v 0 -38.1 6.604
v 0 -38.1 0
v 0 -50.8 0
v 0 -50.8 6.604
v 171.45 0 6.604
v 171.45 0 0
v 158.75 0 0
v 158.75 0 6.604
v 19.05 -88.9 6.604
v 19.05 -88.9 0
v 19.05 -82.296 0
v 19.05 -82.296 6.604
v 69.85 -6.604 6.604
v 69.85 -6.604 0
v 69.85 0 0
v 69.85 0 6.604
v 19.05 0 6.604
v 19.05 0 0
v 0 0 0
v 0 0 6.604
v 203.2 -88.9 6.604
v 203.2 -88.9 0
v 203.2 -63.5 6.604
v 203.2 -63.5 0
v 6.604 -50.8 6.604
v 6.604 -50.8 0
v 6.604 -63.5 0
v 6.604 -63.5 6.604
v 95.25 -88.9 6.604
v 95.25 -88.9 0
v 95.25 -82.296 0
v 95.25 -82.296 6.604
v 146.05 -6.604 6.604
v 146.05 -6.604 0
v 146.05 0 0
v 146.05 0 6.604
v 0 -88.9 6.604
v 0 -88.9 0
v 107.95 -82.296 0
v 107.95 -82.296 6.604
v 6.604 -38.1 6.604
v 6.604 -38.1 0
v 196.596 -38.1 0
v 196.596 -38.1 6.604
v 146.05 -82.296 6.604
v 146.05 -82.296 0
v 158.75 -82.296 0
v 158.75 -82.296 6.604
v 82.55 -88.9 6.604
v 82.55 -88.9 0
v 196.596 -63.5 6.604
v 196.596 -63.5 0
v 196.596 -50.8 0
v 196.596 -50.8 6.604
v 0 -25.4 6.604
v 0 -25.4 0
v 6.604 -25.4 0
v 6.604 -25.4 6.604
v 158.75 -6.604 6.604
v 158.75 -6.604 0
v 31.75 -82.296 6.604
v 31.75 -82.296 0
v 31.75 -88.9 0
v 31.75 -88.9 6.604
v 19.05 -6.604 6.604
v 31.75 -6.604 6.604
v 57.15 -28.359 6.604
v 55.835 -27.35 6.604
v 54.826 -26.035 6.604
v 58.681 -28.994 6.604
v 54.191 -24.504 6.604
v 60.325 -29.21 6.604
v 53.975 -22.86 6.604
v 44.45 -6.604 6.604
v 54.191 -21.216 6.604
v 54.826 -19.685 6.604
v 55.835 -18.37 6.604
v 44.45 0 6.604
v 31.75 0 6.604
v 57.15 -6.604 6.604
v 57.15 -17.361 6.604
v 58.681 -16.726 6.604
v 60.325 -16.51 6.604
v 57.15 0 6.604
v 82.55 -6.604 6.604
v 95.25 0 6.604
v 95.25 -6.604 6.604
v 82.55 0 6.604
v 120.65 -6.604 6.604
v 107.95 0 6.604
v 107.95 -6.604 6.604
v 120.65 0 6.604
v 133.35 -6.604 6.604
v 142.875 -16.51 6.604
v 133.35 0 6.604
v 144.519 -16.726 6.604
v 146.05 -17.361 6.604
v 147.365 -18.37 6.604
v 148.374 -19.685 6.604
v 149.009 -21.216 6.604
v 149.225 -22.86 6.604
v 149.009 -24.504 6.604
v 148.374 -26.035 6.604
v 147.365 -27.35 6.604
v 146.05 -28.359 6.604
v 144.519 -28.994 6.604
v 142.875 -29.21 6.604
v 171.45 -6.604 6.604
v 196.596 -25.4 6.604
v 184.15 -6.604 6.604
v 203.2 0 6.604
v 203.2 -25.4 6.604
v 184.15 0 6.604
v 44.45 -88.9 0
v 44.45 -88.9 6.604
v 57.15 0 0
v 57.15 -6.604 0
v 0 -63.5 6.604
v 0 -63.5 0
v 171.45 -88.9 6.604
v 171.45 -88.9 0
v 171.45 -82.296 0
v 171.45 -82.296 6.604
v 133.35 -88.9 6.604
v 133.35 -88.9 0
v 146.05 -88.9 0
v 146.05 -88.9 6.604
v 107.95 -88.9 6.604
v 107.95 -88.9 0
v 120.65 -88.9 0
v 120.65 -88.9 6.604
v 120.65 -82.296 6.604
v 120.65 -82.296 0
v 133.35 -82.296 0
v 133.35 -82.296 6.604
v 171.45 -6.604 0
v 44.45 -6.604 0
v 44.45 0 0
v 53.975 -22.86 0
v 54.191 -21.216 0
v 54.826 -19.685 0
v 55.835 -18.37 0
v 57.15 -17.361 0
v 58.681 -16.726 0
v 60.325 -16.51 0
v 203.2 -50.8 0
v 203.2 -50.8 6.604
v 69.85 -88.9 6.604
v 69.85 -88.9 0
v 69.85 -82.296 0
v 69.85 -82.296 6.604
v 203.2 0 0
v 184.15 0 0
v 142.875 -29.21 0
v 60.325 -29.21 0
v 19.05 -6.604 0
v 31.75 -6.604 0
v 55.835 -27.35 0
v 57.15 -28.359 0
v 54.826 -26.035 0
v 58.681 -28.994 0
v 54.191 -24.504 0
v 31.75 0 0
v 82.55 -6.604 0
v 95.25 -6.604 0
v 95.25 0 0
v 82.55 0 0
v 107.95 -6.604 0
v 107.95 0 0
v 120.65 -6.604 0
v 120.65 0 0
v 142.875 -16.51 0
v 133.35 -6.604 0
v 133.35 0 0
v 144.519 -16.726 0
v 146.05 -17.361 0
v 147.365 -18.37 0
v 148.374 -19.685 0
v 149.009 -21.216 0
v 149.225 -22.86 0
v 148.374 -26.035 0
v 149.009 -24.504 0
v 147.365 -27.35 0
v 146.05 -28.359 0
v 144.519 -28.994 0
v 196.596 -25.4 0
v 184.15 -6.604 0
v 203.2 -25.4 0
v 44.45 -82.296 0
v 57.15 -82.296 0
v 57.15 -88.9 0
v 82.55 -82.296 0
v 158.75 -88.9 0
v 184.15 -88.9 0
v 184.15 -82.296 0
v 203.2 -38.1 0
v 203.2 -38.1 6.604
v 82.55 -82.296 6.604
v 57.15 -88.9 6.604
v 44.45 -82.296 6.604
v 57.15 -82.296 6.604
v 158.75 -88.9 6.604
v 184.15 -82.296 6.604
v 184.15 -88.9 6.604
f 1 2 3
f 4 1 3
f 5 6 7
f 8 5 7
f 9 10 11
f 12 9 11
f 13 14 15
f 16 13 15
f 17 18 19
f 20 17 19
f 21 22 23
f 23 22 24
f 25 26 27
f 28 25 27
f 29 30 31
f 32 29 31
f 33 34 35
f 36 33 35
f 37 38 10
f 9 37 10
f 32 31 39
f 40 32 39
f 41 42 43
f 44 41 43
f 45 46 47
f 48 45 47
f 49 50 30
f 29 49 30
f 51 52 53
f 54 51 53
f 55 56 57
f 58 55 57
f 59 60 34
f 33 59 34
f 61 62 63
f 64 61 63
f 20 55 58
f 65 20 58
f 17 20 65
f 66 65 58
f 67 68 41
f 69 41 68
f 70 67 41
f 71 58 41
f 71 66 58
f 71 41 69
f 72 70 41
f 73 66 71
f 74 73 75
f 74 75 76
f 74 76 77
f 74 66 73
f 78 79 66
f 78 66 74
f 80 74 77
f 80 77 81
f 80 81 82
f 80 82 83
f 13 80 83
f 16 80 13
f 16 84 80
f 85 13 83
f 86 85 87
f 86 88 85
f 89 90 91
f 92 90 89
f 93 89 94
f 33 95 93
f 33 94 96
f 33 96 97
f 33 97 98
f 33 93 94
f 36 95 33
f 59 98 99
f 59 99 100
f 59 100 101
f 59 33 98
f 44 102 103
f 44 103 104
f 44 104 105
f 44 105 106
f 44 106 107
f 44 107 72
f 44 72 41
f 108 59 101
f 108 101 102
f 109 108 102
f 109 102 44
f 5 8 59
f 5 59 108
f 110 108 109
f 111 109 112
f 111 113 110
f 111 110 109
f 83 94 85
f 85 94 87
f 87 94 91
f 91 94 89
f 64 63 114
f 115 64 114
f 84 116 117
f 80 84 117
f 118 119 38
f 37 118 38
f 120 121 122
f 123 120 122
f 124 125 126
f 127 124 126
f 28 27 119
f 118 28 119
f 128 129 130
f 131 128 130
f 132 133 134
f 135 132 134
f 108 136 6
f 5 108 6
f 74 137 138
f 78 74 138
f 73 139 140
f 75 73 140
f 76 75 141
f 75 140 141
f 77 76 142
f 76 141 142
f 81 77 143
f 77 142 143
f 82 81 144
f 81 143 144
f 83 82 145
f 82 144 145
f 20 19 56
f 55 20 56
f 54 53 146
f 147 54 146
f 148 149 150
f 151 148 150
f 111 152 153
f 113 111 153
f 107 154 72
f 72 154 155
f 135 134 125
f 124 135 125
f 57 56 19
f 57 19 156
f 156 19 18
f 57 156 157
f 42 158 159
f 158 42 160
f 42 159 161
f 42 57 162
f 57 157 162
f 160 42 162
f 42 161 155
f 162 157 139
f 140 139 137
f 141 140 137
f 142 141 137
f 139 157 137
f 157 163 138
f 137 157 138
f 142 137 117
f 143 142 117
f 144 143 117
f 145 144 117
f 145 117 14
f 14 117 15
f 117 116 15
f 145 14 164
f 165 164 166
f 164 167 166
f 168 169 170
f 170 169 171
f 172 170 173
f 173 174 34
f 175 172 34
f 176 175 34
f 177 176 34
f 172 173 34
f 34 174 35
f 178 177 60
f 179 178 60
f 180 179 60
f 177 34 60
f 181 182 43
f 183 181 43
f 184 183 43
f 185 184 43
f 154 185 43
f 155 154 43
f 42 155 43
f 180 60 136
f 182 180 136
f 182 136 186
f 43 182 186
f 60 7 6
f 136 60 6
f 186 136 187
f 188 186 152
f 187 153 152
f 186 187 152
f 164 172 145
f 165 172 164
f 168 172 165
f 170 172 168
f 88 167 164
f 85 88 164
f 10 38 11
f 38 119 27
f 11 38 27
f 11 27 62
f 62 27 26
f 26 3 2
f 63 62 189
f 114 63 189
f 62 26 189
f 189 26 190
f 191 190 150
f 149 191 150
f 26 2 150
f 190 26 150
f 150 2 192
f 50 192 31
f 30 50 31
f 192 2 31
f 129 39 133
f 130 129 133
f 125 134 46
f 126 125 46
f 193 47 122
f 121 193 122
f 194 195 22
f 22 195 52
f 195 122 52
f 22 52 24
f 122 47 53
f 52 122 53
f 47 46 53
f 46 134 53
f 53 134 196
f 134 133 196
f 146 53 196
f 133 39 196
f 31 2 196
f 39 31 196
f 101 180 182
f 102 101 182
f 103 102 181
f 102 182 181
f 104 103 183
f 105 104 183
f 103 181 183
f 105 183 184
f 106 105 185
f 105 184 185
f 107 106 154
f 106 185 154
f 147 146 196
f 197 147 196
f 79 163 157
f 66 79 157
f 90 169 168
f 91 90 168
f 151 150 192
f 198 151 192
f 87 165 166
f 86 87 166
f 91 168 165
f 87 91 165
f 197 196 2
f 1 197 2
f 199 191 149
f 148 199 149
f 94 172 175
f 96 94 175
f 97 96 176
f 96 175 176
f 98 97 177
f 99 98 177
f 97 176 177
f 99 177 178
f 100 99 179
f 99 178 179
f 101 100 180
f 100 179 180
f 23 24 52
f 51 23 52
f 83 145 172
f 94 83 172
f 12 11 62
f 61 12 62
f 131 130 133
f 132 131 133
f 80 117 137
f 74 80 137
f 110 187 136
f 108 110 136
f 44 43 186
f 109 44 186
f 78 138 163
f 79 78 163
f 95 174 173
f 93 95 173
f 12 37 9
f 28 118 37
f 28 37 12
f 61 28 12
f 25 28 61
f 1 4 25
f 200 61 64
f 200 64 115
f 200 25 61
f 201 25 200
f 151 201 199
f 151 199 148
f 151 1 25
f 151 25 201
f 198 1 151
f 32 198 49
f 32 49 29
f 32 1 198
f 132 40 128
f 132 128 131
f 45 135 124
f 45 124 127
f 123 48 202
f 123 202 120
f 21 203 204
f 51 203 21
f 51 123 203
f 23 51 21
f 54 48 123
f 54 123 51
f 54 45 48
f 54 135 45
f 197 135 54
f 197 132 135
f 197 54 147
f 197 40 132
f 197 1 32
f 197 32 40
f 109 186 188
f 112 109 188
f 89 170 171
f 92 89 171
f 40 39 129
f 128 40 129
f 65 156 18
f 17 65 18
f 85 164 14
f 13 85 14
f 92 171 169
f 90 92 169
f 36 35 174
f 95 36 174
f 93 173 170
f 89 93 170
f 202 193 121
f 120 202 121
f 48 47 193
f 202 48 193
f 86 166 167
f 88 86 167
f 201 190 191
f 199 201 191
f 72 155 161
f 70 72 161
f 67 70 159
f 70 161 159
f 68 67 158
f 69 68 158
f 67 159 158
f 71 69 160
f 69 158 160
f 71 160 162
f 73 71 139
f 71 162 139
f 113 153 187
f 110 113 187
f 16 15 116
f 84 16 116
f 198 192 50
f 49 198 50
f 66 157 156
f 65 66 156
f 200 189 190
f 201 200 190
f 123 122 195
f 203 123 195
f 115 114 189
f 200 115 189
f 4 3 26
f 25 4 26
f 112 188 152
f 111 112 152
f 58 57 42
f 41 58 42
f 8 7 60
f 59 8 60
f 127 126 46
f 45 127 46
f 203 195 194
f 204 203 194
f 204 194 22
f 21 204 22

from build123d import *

# Parameters (mm, degrees)
F1_DEPTH = 6.604
F2_DEPTH = 6.604


with BuildPart() as f1:
    # F0 (on Top) → F1 (new body)
    with BuildSketch(Plane.XY):
        Polygon((19.05, 0), (0, 0), (0, -25.4), (6.604, -25.4), (6.604, -38.1), (196.596, -38.1), (196.596, -25.4), (203.2, -25.4), (203.2, 0), (184.15, 0), (184.15, -6.604), (171.45, -6.604), (171.45, 0), (158.75, 0), (158.75, -6.604), (146.05, -6.604), (146.05, 0), (133.35, 0), (133.35, -6.604), (120.65, -6.604), (120.65, 0), (107.95, 0), (107.95, -6.604), (95.25, -6.604), (95.25, 0), (82.55, 0), (82.55, -6.604), (69.85, -6.604), (69.85, 0), (57.15, 0), (57.15, -6.604), (44.45, -6.604), (44.45, 0), (31.75, 0), (31.75, -6.604), (19.05, -6.604), align=None)
        with BuildLine():
            ThreePointArc((53.975, -22.86), (55.834872, -18.369872), (60.325, -16.51))
            Line((60.325, -16.51), (142.875, -16.51))
            ThreePointArc((142.875, -16.51), (147.365128, -18.369872), (149.225, -22.86))
            ThreePointArc((149.225, -22.86), (147.365128, -27.350128), (142.875, -29.21))
            Line((142.875, -29.21), (60.325, -29.21))
            ThreePointArc((60.325, -29.21), (55.834872, -27.350128), (53.975, -22.86))
        make_face(mode=Mode.SUBTRACT)
    extrude(amount=F1_DEPTH)


with BuildPart() as f2:
    # F0 (on Top) → F2 (new body)
    with BuildSketch(Plane.XY):
        Polygon((196.596, -38.1), (6.604, -38.1), (0, -38.1), (0, -50.8), (6.604, -50.8), (6.604, -63.5), (0, -63.5), (0, -88.9), (19.05, -88.9), (19.05, -82.296), (31.75, -82.296), (31.75, -88.9), (44.45, -88.9), (44.45, -82.296), (57.15, -82.296), (57.15, -88.9), (69.85, -88.9), (69.85, -82.296), (82.55, -82.296), (82.55, -88.9), (95.25, -88.9), (95.25, -82.296), (107.95, -82.296), (107.95, -88.9), (120.65, -88.9), (120.65, -82.296), (133.35, -82.296), (133.35, -88.9), (146.05, -88.9), (146.05, -82.296), (158.75, -82.296), (158.75, -88.9), (171.45, -88.9), (171.45, -82.296), (184.15, -82.296), (184.15, -88.9), (203.2, -88.9), (203.2, -63.5), (196.596, -63.5), (196.596, -50.8), (203.2, -50.8), (203.2, -38.1), align=None)
    extrude(amount=F2_DEPTH)


solid = Compound([f1.part, f2.part])
